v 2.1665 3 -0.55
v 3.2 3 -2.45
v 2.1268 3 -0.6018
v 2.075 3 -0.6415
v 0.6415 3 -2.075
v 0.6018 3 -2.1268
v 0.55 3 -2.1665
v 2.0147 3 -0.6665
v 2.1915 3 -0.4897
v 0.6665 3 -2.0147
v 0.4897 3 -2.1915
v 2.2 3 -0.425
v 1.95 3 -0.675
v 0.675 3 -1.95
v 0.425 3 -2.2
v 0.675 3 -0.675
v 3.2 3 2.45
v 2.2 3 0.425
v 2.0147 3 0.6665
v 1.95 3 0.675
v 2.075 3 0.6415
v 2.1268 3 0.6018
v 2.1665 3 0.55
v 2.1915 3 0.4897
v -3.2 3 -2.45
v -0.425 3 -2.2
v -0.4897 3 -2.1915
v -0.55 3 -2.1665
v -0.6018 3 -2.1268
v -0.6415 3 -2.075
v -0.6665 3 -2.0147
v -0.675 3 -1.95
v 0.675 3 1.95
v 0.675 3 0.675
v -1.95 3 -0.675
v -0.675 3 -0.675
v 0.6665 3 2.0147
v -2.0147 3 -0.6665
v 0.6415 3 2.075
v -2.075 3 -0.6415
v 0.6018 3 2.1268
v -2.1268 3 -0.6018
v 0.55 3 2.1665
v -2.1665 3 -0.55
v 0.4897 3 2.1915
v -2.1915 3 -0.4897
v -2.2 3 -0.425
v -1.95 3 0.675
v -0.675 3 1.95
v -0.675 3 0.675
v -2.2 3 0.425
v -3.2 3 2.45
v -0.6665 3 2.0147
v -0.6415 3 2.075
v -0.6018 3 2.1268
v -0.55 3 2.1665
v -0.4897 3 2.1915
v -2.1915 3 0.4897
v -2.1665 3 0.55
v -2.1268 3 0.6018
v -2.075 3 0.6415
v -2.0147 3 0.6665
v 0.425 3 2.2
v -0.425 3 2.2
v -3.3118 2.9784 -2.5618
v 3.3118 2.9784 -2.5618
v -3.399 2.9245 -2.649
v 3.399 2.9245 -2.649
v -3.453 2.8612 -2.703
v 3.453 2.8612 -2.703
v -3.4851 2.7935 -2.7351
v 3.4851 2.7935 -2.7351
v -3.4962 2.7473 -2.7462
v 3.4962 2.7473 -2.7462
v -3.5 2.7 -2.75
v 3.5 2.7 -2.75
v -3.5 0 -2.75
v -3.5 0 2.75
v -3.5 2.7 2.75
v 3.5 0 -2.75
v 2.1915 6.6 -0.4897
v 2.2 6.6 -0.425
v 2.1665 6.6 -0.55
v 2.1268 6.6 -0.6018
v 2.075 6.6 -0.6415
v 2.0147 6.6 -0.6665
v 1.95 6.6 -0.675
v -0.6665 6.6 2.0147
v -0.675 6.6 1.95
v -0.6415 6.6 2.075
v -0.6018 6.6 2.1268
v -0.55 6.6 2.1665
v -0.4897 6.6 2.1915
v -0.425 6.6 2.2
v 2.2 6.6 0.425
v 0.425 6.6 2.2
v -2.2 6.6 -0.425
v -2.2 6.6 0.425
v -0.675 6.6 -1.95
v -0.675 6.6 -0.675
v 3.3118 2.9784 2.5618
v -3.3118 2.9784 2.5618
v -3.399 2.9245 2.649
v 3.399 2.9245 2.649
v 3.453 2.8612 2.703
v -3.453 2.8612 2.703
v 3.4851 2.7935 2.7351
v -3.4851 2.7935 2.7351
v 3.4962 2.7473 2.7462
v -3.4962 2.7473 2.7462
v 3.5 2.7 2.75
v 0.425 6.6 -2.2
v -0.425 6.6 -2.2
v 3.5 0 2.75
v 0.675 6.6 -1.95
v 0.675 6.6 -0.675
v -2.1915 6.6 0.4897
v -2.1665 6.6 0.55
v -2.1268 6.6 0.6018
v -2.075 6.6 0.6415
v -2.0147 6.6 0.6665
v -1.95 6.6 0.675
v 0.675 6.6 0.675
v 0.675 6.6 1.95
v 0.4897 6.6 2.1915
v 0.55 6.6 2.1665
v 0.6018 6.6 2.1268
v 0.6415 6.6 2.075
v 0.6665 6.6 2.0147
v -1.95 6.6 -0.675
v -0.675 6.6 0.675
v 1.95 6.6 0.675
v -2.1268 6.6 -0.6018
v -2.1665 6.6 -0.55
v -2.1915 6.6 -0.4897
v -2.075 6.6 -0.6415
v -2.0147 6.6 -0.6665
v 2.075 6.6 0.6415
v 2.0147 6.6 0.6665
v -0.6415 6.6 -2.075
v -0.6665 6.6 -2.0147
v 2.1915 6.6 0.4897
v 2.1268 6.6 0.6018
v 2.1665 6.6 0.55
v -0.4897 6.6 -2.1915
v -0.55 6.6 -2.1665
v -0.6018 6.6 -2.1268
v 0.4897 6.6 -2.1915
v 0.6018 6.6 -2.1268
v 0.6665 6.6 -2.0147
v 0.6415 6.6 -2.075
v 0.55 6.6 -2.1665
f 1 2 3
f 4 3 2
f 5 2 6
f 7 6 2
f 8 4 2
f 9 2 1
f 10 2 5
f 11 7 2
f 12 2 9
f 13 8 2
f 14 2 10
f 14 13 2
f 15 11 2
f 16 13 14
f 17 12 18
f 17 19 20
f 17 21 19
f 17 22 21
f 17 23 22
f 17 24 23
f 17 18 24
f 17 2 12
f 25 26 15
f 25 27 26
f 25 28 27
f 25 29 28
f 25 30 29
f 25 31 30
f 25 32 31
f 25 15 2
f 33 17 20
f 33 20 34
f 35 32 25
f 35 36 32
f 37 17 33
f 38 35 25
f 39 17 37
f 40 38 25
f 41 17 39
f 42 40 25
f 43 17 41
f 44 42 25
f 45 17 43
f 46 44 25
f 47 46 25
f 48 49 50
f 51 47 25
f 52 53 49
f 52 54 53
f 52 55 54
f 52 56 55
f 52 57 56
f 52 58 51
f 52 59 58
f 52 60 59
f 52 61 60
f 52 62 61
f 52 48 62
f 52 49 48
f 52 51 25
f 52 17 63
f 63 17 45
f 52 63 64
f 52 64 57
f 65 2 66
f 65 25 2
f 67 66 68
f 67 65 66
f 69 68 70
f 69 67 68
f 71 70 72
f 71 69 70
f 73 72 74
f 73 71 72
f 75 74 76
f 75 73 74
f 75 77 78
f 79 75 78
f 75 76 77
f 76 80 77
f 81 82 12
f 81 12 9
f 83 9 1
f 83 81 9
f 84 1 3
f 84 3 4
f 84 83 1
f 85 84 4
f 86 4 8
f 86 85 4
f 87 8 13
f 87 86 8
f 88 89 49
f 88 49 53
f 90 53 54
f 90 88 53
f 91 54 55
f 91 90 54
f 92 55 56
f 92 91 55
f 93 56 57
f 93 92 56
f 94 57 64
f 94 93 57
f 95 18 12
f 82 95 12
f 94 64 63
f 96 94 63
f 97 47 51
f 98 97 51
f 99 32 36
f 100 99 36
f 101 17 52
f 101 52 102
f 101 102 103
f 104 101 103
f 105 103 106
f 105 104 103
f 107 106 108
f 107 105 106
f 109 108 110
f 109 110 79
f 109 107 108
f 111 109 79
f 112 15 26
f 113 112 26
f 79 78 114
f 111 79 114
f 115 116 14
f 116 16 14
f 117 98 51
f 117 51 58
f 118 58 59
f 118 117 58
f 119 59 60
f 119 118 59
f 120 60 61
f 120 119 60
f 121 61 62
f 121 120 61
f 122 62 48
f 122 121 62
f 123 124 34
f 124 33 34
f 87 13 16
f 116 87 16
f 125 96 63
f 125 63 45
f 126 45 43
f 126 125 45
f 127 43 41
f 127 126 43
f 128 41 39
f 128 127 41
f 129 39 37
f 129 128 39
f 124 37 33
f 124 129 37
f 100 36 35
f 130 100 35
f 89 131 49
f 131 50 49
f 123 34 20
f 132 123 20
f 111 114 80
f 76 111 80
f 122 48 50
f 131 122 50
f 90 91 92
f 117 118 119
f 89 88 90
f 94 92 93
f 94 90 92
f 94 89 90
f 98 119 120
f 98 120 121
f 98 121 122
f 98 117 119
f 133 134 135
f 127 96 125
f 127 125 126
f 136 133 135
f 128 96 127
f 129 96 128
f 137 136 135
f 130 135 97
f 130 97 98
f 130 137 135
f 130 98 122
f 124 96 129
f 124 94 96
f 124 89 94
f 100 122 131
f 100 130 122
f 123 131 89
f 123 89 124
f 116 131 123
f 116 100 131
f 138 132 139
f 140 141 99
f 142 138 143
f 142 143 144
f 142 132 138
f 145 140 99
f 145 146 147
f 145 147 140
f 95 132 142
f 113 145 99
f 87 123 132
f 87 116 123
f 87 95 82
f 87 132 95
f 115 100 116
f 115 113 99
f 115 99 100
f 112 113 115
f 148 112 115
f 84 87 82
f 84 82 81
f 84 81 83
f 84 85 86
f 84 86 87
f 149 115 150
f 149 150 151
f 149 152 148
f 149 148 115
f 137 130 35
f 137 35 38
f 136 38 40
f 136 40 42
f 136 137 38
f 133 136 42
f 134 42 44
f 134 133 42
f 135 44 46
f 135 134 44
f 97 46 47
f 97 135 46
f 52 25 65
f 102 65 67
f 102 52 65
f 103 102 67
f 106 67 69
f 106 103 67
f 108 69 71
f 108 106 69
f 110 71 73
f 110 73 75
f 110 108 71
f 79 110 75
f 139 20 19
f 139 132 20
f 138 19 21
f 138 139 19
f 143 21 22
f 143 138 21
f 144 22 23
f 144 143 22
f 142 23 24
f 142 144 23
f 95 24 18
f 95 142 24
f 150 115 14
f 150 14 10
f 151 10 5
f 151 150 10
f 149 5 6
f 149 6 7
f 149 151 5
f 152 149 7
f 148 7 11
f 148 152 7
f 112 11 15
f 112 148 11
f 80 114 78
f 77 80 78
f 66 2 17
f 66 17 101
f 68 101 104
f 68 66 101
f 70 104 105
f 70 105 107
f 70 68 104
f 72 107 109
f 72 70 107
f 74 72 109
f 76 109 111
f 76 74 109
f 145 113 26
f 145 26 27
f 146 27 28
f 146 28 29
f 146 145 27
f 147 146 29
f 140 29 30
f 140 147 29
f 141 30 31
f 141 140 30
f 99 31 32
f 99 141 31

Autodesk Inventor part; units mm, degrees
ref_plane "YZ Plane" through (0, 0, 0) normal (1, 0, 0) x (0, 1, 0)
ref_plane "XZ Plane" through (0, 0, 0) normal (0, 1, 0) x (-1, 0, 0)
ref_plane "XY Plane" through (0, 0, 0) normal (0, 0, 1) x (1, 0, 0)
sketch "Pole Base Profile" plane through (0, 0, 0) normal (0, 1, 0) x (-1, 0, 0)
  line L0 (3.5, 2.75) -> (-3.5, 2.75)
  line L1 (-3.5, 2.75) -> (-3.5, -2.75)
  line L2 (-3.5, -2.75) -> (3.5, -2.75)
  line L3 (3.5, -2.75) -> (3.5, 2.75)
  line L4 (3.5, 2.75) -> (-3.5, -2.75) construction
  line L5 (-3.5, 2.75) -> (3.5, -2.75) construction
  point P0 (0, 0)
  dimension "d0" = 7
  dimension "d1" = 5.5
extrude "Pole Base" add sketch "Pole Base Profile" along normal blind 3
sketch "Cross Base" plane through (0, 3, 0) normal (0, 1, 0) x (1, 0, 0)
  line L0 (-0.675, -2.2) -> (0.675, -2.2)
  line L1 (0.675, -2.2) -> (0.675, 2.2)
  line L2 (0.675, 2.2) -> (-0.675, 2.2)
  line L3 (-0.675, 2.2) -> (-0.675, -2.2)
  line L4 (-0.675, -2.2) -> (0.675, 2.2) construction
  line L5 (0.675, -2.2) -> (-0.675, 2.2) construction
  line L6 (-2.2, -0.675) -> (2.2, -0.675)
  line L7 (2.2, -0.675) -> (2.2, 0.675)
  line L8 (2.2, 0.675) -> (-2.2, 0.675)
  line L9 (-2.2, 0.675) -> (-2.2, -0.675)
  line L10 (-2.2, -0.675) -> (2.2, 0.675) construction
  line L11 (2.2, -0.675) -> (-2.2, 0.675) construction
  point P0 (0, 0)
  dimension "d12" = 1.35
  dimension "d13" = 4.4
  dimension "d14" = 4.4
  dimension "d15" = 1.35
extrude "Pole" add sketch "Cross Base" along normal blind 3.6
fillet "Pole Rounding" radius 0.25 8 edges at (2.2, 4.8, 0.675) (0.675, 4.8, 2.2) (-0.675, 4.8, 2.2) (-2.2, 4.8, 0.675) (-2.2, 4.8, -0.675) (-0.675, 4.8, -2.2) (0.675, 4.8, -2.2) (2.2, 4.8, -0.675)
fillet "Base Rounding" radius 0.3 4 edges at (-3.5, 3, 0) (0, 3, -2.75) (0, 3, 2.75) (3.5, 3, 0)
sketch "Top Center Point" plane through (0, 6.6, 0) normal (0, 1, 0) x (1, 0, 0)
  point P0 (0, 0)
equation "\"d0\" = s_polebl"
equation "\"d1\" = s_polebw"
equation "\"d12\" = k_cmxw"
equation "\"d13\" = k_cmxl"
equation "\"d14\" = d13"
equation "\"d15\" = d12"
equation "\"d8\" = s_poleh"
equation "\"k_width\" = 18.1"
equation "\"k_height\" = 18"
equation "\"k_taper1\" = 1.5"
equation "\"k_taper2\" = 0.5"
equation "\"k_radius\" = 6"
equation "\"k_wthick\" = 1.5"
equation "\"k_ribthick\" = 1.5"
equation "\"k_ribheight\" = 5"
equation "\"k_poleoff\" = 2.2625"
equation "\"k_poledia\" = 5.54"
equation "\"k_cmxw\" = 1.35"
equation "\"k_cmxl\" = 4.4"
equation "\"s_bwidth\" = 15.6"
equation "\"s_poleh\" = 3.6"
equation "\"s_polebw\" = 5.5"
equation "\"s_polebl\" = 7"
equation "\"b_rshift\" = 49.775"
equation "\"b_height\" = 77.4"
equation "\"b_tab\" = 27.15"
equation "\"b_lshift\" = 40.725"
equation "\"b_space\" = 117.65"
equation "\"b_caps\" = 31.675"
equation "\"b_pad\" = 1"
equation "\"b_width\" = 286.5"
equation "\"b_ctrl\" = 22.625"
equation "\"k_staper\" = 1"
equation "\"k_ltaper\" = 1.5"
equation "\"k_sradius\" = 4"
equation "\"k_lradius\" = 6"
equation "\"k_height_t\" = 16"
properties part number "keyswitch-pole_cherrymx"
